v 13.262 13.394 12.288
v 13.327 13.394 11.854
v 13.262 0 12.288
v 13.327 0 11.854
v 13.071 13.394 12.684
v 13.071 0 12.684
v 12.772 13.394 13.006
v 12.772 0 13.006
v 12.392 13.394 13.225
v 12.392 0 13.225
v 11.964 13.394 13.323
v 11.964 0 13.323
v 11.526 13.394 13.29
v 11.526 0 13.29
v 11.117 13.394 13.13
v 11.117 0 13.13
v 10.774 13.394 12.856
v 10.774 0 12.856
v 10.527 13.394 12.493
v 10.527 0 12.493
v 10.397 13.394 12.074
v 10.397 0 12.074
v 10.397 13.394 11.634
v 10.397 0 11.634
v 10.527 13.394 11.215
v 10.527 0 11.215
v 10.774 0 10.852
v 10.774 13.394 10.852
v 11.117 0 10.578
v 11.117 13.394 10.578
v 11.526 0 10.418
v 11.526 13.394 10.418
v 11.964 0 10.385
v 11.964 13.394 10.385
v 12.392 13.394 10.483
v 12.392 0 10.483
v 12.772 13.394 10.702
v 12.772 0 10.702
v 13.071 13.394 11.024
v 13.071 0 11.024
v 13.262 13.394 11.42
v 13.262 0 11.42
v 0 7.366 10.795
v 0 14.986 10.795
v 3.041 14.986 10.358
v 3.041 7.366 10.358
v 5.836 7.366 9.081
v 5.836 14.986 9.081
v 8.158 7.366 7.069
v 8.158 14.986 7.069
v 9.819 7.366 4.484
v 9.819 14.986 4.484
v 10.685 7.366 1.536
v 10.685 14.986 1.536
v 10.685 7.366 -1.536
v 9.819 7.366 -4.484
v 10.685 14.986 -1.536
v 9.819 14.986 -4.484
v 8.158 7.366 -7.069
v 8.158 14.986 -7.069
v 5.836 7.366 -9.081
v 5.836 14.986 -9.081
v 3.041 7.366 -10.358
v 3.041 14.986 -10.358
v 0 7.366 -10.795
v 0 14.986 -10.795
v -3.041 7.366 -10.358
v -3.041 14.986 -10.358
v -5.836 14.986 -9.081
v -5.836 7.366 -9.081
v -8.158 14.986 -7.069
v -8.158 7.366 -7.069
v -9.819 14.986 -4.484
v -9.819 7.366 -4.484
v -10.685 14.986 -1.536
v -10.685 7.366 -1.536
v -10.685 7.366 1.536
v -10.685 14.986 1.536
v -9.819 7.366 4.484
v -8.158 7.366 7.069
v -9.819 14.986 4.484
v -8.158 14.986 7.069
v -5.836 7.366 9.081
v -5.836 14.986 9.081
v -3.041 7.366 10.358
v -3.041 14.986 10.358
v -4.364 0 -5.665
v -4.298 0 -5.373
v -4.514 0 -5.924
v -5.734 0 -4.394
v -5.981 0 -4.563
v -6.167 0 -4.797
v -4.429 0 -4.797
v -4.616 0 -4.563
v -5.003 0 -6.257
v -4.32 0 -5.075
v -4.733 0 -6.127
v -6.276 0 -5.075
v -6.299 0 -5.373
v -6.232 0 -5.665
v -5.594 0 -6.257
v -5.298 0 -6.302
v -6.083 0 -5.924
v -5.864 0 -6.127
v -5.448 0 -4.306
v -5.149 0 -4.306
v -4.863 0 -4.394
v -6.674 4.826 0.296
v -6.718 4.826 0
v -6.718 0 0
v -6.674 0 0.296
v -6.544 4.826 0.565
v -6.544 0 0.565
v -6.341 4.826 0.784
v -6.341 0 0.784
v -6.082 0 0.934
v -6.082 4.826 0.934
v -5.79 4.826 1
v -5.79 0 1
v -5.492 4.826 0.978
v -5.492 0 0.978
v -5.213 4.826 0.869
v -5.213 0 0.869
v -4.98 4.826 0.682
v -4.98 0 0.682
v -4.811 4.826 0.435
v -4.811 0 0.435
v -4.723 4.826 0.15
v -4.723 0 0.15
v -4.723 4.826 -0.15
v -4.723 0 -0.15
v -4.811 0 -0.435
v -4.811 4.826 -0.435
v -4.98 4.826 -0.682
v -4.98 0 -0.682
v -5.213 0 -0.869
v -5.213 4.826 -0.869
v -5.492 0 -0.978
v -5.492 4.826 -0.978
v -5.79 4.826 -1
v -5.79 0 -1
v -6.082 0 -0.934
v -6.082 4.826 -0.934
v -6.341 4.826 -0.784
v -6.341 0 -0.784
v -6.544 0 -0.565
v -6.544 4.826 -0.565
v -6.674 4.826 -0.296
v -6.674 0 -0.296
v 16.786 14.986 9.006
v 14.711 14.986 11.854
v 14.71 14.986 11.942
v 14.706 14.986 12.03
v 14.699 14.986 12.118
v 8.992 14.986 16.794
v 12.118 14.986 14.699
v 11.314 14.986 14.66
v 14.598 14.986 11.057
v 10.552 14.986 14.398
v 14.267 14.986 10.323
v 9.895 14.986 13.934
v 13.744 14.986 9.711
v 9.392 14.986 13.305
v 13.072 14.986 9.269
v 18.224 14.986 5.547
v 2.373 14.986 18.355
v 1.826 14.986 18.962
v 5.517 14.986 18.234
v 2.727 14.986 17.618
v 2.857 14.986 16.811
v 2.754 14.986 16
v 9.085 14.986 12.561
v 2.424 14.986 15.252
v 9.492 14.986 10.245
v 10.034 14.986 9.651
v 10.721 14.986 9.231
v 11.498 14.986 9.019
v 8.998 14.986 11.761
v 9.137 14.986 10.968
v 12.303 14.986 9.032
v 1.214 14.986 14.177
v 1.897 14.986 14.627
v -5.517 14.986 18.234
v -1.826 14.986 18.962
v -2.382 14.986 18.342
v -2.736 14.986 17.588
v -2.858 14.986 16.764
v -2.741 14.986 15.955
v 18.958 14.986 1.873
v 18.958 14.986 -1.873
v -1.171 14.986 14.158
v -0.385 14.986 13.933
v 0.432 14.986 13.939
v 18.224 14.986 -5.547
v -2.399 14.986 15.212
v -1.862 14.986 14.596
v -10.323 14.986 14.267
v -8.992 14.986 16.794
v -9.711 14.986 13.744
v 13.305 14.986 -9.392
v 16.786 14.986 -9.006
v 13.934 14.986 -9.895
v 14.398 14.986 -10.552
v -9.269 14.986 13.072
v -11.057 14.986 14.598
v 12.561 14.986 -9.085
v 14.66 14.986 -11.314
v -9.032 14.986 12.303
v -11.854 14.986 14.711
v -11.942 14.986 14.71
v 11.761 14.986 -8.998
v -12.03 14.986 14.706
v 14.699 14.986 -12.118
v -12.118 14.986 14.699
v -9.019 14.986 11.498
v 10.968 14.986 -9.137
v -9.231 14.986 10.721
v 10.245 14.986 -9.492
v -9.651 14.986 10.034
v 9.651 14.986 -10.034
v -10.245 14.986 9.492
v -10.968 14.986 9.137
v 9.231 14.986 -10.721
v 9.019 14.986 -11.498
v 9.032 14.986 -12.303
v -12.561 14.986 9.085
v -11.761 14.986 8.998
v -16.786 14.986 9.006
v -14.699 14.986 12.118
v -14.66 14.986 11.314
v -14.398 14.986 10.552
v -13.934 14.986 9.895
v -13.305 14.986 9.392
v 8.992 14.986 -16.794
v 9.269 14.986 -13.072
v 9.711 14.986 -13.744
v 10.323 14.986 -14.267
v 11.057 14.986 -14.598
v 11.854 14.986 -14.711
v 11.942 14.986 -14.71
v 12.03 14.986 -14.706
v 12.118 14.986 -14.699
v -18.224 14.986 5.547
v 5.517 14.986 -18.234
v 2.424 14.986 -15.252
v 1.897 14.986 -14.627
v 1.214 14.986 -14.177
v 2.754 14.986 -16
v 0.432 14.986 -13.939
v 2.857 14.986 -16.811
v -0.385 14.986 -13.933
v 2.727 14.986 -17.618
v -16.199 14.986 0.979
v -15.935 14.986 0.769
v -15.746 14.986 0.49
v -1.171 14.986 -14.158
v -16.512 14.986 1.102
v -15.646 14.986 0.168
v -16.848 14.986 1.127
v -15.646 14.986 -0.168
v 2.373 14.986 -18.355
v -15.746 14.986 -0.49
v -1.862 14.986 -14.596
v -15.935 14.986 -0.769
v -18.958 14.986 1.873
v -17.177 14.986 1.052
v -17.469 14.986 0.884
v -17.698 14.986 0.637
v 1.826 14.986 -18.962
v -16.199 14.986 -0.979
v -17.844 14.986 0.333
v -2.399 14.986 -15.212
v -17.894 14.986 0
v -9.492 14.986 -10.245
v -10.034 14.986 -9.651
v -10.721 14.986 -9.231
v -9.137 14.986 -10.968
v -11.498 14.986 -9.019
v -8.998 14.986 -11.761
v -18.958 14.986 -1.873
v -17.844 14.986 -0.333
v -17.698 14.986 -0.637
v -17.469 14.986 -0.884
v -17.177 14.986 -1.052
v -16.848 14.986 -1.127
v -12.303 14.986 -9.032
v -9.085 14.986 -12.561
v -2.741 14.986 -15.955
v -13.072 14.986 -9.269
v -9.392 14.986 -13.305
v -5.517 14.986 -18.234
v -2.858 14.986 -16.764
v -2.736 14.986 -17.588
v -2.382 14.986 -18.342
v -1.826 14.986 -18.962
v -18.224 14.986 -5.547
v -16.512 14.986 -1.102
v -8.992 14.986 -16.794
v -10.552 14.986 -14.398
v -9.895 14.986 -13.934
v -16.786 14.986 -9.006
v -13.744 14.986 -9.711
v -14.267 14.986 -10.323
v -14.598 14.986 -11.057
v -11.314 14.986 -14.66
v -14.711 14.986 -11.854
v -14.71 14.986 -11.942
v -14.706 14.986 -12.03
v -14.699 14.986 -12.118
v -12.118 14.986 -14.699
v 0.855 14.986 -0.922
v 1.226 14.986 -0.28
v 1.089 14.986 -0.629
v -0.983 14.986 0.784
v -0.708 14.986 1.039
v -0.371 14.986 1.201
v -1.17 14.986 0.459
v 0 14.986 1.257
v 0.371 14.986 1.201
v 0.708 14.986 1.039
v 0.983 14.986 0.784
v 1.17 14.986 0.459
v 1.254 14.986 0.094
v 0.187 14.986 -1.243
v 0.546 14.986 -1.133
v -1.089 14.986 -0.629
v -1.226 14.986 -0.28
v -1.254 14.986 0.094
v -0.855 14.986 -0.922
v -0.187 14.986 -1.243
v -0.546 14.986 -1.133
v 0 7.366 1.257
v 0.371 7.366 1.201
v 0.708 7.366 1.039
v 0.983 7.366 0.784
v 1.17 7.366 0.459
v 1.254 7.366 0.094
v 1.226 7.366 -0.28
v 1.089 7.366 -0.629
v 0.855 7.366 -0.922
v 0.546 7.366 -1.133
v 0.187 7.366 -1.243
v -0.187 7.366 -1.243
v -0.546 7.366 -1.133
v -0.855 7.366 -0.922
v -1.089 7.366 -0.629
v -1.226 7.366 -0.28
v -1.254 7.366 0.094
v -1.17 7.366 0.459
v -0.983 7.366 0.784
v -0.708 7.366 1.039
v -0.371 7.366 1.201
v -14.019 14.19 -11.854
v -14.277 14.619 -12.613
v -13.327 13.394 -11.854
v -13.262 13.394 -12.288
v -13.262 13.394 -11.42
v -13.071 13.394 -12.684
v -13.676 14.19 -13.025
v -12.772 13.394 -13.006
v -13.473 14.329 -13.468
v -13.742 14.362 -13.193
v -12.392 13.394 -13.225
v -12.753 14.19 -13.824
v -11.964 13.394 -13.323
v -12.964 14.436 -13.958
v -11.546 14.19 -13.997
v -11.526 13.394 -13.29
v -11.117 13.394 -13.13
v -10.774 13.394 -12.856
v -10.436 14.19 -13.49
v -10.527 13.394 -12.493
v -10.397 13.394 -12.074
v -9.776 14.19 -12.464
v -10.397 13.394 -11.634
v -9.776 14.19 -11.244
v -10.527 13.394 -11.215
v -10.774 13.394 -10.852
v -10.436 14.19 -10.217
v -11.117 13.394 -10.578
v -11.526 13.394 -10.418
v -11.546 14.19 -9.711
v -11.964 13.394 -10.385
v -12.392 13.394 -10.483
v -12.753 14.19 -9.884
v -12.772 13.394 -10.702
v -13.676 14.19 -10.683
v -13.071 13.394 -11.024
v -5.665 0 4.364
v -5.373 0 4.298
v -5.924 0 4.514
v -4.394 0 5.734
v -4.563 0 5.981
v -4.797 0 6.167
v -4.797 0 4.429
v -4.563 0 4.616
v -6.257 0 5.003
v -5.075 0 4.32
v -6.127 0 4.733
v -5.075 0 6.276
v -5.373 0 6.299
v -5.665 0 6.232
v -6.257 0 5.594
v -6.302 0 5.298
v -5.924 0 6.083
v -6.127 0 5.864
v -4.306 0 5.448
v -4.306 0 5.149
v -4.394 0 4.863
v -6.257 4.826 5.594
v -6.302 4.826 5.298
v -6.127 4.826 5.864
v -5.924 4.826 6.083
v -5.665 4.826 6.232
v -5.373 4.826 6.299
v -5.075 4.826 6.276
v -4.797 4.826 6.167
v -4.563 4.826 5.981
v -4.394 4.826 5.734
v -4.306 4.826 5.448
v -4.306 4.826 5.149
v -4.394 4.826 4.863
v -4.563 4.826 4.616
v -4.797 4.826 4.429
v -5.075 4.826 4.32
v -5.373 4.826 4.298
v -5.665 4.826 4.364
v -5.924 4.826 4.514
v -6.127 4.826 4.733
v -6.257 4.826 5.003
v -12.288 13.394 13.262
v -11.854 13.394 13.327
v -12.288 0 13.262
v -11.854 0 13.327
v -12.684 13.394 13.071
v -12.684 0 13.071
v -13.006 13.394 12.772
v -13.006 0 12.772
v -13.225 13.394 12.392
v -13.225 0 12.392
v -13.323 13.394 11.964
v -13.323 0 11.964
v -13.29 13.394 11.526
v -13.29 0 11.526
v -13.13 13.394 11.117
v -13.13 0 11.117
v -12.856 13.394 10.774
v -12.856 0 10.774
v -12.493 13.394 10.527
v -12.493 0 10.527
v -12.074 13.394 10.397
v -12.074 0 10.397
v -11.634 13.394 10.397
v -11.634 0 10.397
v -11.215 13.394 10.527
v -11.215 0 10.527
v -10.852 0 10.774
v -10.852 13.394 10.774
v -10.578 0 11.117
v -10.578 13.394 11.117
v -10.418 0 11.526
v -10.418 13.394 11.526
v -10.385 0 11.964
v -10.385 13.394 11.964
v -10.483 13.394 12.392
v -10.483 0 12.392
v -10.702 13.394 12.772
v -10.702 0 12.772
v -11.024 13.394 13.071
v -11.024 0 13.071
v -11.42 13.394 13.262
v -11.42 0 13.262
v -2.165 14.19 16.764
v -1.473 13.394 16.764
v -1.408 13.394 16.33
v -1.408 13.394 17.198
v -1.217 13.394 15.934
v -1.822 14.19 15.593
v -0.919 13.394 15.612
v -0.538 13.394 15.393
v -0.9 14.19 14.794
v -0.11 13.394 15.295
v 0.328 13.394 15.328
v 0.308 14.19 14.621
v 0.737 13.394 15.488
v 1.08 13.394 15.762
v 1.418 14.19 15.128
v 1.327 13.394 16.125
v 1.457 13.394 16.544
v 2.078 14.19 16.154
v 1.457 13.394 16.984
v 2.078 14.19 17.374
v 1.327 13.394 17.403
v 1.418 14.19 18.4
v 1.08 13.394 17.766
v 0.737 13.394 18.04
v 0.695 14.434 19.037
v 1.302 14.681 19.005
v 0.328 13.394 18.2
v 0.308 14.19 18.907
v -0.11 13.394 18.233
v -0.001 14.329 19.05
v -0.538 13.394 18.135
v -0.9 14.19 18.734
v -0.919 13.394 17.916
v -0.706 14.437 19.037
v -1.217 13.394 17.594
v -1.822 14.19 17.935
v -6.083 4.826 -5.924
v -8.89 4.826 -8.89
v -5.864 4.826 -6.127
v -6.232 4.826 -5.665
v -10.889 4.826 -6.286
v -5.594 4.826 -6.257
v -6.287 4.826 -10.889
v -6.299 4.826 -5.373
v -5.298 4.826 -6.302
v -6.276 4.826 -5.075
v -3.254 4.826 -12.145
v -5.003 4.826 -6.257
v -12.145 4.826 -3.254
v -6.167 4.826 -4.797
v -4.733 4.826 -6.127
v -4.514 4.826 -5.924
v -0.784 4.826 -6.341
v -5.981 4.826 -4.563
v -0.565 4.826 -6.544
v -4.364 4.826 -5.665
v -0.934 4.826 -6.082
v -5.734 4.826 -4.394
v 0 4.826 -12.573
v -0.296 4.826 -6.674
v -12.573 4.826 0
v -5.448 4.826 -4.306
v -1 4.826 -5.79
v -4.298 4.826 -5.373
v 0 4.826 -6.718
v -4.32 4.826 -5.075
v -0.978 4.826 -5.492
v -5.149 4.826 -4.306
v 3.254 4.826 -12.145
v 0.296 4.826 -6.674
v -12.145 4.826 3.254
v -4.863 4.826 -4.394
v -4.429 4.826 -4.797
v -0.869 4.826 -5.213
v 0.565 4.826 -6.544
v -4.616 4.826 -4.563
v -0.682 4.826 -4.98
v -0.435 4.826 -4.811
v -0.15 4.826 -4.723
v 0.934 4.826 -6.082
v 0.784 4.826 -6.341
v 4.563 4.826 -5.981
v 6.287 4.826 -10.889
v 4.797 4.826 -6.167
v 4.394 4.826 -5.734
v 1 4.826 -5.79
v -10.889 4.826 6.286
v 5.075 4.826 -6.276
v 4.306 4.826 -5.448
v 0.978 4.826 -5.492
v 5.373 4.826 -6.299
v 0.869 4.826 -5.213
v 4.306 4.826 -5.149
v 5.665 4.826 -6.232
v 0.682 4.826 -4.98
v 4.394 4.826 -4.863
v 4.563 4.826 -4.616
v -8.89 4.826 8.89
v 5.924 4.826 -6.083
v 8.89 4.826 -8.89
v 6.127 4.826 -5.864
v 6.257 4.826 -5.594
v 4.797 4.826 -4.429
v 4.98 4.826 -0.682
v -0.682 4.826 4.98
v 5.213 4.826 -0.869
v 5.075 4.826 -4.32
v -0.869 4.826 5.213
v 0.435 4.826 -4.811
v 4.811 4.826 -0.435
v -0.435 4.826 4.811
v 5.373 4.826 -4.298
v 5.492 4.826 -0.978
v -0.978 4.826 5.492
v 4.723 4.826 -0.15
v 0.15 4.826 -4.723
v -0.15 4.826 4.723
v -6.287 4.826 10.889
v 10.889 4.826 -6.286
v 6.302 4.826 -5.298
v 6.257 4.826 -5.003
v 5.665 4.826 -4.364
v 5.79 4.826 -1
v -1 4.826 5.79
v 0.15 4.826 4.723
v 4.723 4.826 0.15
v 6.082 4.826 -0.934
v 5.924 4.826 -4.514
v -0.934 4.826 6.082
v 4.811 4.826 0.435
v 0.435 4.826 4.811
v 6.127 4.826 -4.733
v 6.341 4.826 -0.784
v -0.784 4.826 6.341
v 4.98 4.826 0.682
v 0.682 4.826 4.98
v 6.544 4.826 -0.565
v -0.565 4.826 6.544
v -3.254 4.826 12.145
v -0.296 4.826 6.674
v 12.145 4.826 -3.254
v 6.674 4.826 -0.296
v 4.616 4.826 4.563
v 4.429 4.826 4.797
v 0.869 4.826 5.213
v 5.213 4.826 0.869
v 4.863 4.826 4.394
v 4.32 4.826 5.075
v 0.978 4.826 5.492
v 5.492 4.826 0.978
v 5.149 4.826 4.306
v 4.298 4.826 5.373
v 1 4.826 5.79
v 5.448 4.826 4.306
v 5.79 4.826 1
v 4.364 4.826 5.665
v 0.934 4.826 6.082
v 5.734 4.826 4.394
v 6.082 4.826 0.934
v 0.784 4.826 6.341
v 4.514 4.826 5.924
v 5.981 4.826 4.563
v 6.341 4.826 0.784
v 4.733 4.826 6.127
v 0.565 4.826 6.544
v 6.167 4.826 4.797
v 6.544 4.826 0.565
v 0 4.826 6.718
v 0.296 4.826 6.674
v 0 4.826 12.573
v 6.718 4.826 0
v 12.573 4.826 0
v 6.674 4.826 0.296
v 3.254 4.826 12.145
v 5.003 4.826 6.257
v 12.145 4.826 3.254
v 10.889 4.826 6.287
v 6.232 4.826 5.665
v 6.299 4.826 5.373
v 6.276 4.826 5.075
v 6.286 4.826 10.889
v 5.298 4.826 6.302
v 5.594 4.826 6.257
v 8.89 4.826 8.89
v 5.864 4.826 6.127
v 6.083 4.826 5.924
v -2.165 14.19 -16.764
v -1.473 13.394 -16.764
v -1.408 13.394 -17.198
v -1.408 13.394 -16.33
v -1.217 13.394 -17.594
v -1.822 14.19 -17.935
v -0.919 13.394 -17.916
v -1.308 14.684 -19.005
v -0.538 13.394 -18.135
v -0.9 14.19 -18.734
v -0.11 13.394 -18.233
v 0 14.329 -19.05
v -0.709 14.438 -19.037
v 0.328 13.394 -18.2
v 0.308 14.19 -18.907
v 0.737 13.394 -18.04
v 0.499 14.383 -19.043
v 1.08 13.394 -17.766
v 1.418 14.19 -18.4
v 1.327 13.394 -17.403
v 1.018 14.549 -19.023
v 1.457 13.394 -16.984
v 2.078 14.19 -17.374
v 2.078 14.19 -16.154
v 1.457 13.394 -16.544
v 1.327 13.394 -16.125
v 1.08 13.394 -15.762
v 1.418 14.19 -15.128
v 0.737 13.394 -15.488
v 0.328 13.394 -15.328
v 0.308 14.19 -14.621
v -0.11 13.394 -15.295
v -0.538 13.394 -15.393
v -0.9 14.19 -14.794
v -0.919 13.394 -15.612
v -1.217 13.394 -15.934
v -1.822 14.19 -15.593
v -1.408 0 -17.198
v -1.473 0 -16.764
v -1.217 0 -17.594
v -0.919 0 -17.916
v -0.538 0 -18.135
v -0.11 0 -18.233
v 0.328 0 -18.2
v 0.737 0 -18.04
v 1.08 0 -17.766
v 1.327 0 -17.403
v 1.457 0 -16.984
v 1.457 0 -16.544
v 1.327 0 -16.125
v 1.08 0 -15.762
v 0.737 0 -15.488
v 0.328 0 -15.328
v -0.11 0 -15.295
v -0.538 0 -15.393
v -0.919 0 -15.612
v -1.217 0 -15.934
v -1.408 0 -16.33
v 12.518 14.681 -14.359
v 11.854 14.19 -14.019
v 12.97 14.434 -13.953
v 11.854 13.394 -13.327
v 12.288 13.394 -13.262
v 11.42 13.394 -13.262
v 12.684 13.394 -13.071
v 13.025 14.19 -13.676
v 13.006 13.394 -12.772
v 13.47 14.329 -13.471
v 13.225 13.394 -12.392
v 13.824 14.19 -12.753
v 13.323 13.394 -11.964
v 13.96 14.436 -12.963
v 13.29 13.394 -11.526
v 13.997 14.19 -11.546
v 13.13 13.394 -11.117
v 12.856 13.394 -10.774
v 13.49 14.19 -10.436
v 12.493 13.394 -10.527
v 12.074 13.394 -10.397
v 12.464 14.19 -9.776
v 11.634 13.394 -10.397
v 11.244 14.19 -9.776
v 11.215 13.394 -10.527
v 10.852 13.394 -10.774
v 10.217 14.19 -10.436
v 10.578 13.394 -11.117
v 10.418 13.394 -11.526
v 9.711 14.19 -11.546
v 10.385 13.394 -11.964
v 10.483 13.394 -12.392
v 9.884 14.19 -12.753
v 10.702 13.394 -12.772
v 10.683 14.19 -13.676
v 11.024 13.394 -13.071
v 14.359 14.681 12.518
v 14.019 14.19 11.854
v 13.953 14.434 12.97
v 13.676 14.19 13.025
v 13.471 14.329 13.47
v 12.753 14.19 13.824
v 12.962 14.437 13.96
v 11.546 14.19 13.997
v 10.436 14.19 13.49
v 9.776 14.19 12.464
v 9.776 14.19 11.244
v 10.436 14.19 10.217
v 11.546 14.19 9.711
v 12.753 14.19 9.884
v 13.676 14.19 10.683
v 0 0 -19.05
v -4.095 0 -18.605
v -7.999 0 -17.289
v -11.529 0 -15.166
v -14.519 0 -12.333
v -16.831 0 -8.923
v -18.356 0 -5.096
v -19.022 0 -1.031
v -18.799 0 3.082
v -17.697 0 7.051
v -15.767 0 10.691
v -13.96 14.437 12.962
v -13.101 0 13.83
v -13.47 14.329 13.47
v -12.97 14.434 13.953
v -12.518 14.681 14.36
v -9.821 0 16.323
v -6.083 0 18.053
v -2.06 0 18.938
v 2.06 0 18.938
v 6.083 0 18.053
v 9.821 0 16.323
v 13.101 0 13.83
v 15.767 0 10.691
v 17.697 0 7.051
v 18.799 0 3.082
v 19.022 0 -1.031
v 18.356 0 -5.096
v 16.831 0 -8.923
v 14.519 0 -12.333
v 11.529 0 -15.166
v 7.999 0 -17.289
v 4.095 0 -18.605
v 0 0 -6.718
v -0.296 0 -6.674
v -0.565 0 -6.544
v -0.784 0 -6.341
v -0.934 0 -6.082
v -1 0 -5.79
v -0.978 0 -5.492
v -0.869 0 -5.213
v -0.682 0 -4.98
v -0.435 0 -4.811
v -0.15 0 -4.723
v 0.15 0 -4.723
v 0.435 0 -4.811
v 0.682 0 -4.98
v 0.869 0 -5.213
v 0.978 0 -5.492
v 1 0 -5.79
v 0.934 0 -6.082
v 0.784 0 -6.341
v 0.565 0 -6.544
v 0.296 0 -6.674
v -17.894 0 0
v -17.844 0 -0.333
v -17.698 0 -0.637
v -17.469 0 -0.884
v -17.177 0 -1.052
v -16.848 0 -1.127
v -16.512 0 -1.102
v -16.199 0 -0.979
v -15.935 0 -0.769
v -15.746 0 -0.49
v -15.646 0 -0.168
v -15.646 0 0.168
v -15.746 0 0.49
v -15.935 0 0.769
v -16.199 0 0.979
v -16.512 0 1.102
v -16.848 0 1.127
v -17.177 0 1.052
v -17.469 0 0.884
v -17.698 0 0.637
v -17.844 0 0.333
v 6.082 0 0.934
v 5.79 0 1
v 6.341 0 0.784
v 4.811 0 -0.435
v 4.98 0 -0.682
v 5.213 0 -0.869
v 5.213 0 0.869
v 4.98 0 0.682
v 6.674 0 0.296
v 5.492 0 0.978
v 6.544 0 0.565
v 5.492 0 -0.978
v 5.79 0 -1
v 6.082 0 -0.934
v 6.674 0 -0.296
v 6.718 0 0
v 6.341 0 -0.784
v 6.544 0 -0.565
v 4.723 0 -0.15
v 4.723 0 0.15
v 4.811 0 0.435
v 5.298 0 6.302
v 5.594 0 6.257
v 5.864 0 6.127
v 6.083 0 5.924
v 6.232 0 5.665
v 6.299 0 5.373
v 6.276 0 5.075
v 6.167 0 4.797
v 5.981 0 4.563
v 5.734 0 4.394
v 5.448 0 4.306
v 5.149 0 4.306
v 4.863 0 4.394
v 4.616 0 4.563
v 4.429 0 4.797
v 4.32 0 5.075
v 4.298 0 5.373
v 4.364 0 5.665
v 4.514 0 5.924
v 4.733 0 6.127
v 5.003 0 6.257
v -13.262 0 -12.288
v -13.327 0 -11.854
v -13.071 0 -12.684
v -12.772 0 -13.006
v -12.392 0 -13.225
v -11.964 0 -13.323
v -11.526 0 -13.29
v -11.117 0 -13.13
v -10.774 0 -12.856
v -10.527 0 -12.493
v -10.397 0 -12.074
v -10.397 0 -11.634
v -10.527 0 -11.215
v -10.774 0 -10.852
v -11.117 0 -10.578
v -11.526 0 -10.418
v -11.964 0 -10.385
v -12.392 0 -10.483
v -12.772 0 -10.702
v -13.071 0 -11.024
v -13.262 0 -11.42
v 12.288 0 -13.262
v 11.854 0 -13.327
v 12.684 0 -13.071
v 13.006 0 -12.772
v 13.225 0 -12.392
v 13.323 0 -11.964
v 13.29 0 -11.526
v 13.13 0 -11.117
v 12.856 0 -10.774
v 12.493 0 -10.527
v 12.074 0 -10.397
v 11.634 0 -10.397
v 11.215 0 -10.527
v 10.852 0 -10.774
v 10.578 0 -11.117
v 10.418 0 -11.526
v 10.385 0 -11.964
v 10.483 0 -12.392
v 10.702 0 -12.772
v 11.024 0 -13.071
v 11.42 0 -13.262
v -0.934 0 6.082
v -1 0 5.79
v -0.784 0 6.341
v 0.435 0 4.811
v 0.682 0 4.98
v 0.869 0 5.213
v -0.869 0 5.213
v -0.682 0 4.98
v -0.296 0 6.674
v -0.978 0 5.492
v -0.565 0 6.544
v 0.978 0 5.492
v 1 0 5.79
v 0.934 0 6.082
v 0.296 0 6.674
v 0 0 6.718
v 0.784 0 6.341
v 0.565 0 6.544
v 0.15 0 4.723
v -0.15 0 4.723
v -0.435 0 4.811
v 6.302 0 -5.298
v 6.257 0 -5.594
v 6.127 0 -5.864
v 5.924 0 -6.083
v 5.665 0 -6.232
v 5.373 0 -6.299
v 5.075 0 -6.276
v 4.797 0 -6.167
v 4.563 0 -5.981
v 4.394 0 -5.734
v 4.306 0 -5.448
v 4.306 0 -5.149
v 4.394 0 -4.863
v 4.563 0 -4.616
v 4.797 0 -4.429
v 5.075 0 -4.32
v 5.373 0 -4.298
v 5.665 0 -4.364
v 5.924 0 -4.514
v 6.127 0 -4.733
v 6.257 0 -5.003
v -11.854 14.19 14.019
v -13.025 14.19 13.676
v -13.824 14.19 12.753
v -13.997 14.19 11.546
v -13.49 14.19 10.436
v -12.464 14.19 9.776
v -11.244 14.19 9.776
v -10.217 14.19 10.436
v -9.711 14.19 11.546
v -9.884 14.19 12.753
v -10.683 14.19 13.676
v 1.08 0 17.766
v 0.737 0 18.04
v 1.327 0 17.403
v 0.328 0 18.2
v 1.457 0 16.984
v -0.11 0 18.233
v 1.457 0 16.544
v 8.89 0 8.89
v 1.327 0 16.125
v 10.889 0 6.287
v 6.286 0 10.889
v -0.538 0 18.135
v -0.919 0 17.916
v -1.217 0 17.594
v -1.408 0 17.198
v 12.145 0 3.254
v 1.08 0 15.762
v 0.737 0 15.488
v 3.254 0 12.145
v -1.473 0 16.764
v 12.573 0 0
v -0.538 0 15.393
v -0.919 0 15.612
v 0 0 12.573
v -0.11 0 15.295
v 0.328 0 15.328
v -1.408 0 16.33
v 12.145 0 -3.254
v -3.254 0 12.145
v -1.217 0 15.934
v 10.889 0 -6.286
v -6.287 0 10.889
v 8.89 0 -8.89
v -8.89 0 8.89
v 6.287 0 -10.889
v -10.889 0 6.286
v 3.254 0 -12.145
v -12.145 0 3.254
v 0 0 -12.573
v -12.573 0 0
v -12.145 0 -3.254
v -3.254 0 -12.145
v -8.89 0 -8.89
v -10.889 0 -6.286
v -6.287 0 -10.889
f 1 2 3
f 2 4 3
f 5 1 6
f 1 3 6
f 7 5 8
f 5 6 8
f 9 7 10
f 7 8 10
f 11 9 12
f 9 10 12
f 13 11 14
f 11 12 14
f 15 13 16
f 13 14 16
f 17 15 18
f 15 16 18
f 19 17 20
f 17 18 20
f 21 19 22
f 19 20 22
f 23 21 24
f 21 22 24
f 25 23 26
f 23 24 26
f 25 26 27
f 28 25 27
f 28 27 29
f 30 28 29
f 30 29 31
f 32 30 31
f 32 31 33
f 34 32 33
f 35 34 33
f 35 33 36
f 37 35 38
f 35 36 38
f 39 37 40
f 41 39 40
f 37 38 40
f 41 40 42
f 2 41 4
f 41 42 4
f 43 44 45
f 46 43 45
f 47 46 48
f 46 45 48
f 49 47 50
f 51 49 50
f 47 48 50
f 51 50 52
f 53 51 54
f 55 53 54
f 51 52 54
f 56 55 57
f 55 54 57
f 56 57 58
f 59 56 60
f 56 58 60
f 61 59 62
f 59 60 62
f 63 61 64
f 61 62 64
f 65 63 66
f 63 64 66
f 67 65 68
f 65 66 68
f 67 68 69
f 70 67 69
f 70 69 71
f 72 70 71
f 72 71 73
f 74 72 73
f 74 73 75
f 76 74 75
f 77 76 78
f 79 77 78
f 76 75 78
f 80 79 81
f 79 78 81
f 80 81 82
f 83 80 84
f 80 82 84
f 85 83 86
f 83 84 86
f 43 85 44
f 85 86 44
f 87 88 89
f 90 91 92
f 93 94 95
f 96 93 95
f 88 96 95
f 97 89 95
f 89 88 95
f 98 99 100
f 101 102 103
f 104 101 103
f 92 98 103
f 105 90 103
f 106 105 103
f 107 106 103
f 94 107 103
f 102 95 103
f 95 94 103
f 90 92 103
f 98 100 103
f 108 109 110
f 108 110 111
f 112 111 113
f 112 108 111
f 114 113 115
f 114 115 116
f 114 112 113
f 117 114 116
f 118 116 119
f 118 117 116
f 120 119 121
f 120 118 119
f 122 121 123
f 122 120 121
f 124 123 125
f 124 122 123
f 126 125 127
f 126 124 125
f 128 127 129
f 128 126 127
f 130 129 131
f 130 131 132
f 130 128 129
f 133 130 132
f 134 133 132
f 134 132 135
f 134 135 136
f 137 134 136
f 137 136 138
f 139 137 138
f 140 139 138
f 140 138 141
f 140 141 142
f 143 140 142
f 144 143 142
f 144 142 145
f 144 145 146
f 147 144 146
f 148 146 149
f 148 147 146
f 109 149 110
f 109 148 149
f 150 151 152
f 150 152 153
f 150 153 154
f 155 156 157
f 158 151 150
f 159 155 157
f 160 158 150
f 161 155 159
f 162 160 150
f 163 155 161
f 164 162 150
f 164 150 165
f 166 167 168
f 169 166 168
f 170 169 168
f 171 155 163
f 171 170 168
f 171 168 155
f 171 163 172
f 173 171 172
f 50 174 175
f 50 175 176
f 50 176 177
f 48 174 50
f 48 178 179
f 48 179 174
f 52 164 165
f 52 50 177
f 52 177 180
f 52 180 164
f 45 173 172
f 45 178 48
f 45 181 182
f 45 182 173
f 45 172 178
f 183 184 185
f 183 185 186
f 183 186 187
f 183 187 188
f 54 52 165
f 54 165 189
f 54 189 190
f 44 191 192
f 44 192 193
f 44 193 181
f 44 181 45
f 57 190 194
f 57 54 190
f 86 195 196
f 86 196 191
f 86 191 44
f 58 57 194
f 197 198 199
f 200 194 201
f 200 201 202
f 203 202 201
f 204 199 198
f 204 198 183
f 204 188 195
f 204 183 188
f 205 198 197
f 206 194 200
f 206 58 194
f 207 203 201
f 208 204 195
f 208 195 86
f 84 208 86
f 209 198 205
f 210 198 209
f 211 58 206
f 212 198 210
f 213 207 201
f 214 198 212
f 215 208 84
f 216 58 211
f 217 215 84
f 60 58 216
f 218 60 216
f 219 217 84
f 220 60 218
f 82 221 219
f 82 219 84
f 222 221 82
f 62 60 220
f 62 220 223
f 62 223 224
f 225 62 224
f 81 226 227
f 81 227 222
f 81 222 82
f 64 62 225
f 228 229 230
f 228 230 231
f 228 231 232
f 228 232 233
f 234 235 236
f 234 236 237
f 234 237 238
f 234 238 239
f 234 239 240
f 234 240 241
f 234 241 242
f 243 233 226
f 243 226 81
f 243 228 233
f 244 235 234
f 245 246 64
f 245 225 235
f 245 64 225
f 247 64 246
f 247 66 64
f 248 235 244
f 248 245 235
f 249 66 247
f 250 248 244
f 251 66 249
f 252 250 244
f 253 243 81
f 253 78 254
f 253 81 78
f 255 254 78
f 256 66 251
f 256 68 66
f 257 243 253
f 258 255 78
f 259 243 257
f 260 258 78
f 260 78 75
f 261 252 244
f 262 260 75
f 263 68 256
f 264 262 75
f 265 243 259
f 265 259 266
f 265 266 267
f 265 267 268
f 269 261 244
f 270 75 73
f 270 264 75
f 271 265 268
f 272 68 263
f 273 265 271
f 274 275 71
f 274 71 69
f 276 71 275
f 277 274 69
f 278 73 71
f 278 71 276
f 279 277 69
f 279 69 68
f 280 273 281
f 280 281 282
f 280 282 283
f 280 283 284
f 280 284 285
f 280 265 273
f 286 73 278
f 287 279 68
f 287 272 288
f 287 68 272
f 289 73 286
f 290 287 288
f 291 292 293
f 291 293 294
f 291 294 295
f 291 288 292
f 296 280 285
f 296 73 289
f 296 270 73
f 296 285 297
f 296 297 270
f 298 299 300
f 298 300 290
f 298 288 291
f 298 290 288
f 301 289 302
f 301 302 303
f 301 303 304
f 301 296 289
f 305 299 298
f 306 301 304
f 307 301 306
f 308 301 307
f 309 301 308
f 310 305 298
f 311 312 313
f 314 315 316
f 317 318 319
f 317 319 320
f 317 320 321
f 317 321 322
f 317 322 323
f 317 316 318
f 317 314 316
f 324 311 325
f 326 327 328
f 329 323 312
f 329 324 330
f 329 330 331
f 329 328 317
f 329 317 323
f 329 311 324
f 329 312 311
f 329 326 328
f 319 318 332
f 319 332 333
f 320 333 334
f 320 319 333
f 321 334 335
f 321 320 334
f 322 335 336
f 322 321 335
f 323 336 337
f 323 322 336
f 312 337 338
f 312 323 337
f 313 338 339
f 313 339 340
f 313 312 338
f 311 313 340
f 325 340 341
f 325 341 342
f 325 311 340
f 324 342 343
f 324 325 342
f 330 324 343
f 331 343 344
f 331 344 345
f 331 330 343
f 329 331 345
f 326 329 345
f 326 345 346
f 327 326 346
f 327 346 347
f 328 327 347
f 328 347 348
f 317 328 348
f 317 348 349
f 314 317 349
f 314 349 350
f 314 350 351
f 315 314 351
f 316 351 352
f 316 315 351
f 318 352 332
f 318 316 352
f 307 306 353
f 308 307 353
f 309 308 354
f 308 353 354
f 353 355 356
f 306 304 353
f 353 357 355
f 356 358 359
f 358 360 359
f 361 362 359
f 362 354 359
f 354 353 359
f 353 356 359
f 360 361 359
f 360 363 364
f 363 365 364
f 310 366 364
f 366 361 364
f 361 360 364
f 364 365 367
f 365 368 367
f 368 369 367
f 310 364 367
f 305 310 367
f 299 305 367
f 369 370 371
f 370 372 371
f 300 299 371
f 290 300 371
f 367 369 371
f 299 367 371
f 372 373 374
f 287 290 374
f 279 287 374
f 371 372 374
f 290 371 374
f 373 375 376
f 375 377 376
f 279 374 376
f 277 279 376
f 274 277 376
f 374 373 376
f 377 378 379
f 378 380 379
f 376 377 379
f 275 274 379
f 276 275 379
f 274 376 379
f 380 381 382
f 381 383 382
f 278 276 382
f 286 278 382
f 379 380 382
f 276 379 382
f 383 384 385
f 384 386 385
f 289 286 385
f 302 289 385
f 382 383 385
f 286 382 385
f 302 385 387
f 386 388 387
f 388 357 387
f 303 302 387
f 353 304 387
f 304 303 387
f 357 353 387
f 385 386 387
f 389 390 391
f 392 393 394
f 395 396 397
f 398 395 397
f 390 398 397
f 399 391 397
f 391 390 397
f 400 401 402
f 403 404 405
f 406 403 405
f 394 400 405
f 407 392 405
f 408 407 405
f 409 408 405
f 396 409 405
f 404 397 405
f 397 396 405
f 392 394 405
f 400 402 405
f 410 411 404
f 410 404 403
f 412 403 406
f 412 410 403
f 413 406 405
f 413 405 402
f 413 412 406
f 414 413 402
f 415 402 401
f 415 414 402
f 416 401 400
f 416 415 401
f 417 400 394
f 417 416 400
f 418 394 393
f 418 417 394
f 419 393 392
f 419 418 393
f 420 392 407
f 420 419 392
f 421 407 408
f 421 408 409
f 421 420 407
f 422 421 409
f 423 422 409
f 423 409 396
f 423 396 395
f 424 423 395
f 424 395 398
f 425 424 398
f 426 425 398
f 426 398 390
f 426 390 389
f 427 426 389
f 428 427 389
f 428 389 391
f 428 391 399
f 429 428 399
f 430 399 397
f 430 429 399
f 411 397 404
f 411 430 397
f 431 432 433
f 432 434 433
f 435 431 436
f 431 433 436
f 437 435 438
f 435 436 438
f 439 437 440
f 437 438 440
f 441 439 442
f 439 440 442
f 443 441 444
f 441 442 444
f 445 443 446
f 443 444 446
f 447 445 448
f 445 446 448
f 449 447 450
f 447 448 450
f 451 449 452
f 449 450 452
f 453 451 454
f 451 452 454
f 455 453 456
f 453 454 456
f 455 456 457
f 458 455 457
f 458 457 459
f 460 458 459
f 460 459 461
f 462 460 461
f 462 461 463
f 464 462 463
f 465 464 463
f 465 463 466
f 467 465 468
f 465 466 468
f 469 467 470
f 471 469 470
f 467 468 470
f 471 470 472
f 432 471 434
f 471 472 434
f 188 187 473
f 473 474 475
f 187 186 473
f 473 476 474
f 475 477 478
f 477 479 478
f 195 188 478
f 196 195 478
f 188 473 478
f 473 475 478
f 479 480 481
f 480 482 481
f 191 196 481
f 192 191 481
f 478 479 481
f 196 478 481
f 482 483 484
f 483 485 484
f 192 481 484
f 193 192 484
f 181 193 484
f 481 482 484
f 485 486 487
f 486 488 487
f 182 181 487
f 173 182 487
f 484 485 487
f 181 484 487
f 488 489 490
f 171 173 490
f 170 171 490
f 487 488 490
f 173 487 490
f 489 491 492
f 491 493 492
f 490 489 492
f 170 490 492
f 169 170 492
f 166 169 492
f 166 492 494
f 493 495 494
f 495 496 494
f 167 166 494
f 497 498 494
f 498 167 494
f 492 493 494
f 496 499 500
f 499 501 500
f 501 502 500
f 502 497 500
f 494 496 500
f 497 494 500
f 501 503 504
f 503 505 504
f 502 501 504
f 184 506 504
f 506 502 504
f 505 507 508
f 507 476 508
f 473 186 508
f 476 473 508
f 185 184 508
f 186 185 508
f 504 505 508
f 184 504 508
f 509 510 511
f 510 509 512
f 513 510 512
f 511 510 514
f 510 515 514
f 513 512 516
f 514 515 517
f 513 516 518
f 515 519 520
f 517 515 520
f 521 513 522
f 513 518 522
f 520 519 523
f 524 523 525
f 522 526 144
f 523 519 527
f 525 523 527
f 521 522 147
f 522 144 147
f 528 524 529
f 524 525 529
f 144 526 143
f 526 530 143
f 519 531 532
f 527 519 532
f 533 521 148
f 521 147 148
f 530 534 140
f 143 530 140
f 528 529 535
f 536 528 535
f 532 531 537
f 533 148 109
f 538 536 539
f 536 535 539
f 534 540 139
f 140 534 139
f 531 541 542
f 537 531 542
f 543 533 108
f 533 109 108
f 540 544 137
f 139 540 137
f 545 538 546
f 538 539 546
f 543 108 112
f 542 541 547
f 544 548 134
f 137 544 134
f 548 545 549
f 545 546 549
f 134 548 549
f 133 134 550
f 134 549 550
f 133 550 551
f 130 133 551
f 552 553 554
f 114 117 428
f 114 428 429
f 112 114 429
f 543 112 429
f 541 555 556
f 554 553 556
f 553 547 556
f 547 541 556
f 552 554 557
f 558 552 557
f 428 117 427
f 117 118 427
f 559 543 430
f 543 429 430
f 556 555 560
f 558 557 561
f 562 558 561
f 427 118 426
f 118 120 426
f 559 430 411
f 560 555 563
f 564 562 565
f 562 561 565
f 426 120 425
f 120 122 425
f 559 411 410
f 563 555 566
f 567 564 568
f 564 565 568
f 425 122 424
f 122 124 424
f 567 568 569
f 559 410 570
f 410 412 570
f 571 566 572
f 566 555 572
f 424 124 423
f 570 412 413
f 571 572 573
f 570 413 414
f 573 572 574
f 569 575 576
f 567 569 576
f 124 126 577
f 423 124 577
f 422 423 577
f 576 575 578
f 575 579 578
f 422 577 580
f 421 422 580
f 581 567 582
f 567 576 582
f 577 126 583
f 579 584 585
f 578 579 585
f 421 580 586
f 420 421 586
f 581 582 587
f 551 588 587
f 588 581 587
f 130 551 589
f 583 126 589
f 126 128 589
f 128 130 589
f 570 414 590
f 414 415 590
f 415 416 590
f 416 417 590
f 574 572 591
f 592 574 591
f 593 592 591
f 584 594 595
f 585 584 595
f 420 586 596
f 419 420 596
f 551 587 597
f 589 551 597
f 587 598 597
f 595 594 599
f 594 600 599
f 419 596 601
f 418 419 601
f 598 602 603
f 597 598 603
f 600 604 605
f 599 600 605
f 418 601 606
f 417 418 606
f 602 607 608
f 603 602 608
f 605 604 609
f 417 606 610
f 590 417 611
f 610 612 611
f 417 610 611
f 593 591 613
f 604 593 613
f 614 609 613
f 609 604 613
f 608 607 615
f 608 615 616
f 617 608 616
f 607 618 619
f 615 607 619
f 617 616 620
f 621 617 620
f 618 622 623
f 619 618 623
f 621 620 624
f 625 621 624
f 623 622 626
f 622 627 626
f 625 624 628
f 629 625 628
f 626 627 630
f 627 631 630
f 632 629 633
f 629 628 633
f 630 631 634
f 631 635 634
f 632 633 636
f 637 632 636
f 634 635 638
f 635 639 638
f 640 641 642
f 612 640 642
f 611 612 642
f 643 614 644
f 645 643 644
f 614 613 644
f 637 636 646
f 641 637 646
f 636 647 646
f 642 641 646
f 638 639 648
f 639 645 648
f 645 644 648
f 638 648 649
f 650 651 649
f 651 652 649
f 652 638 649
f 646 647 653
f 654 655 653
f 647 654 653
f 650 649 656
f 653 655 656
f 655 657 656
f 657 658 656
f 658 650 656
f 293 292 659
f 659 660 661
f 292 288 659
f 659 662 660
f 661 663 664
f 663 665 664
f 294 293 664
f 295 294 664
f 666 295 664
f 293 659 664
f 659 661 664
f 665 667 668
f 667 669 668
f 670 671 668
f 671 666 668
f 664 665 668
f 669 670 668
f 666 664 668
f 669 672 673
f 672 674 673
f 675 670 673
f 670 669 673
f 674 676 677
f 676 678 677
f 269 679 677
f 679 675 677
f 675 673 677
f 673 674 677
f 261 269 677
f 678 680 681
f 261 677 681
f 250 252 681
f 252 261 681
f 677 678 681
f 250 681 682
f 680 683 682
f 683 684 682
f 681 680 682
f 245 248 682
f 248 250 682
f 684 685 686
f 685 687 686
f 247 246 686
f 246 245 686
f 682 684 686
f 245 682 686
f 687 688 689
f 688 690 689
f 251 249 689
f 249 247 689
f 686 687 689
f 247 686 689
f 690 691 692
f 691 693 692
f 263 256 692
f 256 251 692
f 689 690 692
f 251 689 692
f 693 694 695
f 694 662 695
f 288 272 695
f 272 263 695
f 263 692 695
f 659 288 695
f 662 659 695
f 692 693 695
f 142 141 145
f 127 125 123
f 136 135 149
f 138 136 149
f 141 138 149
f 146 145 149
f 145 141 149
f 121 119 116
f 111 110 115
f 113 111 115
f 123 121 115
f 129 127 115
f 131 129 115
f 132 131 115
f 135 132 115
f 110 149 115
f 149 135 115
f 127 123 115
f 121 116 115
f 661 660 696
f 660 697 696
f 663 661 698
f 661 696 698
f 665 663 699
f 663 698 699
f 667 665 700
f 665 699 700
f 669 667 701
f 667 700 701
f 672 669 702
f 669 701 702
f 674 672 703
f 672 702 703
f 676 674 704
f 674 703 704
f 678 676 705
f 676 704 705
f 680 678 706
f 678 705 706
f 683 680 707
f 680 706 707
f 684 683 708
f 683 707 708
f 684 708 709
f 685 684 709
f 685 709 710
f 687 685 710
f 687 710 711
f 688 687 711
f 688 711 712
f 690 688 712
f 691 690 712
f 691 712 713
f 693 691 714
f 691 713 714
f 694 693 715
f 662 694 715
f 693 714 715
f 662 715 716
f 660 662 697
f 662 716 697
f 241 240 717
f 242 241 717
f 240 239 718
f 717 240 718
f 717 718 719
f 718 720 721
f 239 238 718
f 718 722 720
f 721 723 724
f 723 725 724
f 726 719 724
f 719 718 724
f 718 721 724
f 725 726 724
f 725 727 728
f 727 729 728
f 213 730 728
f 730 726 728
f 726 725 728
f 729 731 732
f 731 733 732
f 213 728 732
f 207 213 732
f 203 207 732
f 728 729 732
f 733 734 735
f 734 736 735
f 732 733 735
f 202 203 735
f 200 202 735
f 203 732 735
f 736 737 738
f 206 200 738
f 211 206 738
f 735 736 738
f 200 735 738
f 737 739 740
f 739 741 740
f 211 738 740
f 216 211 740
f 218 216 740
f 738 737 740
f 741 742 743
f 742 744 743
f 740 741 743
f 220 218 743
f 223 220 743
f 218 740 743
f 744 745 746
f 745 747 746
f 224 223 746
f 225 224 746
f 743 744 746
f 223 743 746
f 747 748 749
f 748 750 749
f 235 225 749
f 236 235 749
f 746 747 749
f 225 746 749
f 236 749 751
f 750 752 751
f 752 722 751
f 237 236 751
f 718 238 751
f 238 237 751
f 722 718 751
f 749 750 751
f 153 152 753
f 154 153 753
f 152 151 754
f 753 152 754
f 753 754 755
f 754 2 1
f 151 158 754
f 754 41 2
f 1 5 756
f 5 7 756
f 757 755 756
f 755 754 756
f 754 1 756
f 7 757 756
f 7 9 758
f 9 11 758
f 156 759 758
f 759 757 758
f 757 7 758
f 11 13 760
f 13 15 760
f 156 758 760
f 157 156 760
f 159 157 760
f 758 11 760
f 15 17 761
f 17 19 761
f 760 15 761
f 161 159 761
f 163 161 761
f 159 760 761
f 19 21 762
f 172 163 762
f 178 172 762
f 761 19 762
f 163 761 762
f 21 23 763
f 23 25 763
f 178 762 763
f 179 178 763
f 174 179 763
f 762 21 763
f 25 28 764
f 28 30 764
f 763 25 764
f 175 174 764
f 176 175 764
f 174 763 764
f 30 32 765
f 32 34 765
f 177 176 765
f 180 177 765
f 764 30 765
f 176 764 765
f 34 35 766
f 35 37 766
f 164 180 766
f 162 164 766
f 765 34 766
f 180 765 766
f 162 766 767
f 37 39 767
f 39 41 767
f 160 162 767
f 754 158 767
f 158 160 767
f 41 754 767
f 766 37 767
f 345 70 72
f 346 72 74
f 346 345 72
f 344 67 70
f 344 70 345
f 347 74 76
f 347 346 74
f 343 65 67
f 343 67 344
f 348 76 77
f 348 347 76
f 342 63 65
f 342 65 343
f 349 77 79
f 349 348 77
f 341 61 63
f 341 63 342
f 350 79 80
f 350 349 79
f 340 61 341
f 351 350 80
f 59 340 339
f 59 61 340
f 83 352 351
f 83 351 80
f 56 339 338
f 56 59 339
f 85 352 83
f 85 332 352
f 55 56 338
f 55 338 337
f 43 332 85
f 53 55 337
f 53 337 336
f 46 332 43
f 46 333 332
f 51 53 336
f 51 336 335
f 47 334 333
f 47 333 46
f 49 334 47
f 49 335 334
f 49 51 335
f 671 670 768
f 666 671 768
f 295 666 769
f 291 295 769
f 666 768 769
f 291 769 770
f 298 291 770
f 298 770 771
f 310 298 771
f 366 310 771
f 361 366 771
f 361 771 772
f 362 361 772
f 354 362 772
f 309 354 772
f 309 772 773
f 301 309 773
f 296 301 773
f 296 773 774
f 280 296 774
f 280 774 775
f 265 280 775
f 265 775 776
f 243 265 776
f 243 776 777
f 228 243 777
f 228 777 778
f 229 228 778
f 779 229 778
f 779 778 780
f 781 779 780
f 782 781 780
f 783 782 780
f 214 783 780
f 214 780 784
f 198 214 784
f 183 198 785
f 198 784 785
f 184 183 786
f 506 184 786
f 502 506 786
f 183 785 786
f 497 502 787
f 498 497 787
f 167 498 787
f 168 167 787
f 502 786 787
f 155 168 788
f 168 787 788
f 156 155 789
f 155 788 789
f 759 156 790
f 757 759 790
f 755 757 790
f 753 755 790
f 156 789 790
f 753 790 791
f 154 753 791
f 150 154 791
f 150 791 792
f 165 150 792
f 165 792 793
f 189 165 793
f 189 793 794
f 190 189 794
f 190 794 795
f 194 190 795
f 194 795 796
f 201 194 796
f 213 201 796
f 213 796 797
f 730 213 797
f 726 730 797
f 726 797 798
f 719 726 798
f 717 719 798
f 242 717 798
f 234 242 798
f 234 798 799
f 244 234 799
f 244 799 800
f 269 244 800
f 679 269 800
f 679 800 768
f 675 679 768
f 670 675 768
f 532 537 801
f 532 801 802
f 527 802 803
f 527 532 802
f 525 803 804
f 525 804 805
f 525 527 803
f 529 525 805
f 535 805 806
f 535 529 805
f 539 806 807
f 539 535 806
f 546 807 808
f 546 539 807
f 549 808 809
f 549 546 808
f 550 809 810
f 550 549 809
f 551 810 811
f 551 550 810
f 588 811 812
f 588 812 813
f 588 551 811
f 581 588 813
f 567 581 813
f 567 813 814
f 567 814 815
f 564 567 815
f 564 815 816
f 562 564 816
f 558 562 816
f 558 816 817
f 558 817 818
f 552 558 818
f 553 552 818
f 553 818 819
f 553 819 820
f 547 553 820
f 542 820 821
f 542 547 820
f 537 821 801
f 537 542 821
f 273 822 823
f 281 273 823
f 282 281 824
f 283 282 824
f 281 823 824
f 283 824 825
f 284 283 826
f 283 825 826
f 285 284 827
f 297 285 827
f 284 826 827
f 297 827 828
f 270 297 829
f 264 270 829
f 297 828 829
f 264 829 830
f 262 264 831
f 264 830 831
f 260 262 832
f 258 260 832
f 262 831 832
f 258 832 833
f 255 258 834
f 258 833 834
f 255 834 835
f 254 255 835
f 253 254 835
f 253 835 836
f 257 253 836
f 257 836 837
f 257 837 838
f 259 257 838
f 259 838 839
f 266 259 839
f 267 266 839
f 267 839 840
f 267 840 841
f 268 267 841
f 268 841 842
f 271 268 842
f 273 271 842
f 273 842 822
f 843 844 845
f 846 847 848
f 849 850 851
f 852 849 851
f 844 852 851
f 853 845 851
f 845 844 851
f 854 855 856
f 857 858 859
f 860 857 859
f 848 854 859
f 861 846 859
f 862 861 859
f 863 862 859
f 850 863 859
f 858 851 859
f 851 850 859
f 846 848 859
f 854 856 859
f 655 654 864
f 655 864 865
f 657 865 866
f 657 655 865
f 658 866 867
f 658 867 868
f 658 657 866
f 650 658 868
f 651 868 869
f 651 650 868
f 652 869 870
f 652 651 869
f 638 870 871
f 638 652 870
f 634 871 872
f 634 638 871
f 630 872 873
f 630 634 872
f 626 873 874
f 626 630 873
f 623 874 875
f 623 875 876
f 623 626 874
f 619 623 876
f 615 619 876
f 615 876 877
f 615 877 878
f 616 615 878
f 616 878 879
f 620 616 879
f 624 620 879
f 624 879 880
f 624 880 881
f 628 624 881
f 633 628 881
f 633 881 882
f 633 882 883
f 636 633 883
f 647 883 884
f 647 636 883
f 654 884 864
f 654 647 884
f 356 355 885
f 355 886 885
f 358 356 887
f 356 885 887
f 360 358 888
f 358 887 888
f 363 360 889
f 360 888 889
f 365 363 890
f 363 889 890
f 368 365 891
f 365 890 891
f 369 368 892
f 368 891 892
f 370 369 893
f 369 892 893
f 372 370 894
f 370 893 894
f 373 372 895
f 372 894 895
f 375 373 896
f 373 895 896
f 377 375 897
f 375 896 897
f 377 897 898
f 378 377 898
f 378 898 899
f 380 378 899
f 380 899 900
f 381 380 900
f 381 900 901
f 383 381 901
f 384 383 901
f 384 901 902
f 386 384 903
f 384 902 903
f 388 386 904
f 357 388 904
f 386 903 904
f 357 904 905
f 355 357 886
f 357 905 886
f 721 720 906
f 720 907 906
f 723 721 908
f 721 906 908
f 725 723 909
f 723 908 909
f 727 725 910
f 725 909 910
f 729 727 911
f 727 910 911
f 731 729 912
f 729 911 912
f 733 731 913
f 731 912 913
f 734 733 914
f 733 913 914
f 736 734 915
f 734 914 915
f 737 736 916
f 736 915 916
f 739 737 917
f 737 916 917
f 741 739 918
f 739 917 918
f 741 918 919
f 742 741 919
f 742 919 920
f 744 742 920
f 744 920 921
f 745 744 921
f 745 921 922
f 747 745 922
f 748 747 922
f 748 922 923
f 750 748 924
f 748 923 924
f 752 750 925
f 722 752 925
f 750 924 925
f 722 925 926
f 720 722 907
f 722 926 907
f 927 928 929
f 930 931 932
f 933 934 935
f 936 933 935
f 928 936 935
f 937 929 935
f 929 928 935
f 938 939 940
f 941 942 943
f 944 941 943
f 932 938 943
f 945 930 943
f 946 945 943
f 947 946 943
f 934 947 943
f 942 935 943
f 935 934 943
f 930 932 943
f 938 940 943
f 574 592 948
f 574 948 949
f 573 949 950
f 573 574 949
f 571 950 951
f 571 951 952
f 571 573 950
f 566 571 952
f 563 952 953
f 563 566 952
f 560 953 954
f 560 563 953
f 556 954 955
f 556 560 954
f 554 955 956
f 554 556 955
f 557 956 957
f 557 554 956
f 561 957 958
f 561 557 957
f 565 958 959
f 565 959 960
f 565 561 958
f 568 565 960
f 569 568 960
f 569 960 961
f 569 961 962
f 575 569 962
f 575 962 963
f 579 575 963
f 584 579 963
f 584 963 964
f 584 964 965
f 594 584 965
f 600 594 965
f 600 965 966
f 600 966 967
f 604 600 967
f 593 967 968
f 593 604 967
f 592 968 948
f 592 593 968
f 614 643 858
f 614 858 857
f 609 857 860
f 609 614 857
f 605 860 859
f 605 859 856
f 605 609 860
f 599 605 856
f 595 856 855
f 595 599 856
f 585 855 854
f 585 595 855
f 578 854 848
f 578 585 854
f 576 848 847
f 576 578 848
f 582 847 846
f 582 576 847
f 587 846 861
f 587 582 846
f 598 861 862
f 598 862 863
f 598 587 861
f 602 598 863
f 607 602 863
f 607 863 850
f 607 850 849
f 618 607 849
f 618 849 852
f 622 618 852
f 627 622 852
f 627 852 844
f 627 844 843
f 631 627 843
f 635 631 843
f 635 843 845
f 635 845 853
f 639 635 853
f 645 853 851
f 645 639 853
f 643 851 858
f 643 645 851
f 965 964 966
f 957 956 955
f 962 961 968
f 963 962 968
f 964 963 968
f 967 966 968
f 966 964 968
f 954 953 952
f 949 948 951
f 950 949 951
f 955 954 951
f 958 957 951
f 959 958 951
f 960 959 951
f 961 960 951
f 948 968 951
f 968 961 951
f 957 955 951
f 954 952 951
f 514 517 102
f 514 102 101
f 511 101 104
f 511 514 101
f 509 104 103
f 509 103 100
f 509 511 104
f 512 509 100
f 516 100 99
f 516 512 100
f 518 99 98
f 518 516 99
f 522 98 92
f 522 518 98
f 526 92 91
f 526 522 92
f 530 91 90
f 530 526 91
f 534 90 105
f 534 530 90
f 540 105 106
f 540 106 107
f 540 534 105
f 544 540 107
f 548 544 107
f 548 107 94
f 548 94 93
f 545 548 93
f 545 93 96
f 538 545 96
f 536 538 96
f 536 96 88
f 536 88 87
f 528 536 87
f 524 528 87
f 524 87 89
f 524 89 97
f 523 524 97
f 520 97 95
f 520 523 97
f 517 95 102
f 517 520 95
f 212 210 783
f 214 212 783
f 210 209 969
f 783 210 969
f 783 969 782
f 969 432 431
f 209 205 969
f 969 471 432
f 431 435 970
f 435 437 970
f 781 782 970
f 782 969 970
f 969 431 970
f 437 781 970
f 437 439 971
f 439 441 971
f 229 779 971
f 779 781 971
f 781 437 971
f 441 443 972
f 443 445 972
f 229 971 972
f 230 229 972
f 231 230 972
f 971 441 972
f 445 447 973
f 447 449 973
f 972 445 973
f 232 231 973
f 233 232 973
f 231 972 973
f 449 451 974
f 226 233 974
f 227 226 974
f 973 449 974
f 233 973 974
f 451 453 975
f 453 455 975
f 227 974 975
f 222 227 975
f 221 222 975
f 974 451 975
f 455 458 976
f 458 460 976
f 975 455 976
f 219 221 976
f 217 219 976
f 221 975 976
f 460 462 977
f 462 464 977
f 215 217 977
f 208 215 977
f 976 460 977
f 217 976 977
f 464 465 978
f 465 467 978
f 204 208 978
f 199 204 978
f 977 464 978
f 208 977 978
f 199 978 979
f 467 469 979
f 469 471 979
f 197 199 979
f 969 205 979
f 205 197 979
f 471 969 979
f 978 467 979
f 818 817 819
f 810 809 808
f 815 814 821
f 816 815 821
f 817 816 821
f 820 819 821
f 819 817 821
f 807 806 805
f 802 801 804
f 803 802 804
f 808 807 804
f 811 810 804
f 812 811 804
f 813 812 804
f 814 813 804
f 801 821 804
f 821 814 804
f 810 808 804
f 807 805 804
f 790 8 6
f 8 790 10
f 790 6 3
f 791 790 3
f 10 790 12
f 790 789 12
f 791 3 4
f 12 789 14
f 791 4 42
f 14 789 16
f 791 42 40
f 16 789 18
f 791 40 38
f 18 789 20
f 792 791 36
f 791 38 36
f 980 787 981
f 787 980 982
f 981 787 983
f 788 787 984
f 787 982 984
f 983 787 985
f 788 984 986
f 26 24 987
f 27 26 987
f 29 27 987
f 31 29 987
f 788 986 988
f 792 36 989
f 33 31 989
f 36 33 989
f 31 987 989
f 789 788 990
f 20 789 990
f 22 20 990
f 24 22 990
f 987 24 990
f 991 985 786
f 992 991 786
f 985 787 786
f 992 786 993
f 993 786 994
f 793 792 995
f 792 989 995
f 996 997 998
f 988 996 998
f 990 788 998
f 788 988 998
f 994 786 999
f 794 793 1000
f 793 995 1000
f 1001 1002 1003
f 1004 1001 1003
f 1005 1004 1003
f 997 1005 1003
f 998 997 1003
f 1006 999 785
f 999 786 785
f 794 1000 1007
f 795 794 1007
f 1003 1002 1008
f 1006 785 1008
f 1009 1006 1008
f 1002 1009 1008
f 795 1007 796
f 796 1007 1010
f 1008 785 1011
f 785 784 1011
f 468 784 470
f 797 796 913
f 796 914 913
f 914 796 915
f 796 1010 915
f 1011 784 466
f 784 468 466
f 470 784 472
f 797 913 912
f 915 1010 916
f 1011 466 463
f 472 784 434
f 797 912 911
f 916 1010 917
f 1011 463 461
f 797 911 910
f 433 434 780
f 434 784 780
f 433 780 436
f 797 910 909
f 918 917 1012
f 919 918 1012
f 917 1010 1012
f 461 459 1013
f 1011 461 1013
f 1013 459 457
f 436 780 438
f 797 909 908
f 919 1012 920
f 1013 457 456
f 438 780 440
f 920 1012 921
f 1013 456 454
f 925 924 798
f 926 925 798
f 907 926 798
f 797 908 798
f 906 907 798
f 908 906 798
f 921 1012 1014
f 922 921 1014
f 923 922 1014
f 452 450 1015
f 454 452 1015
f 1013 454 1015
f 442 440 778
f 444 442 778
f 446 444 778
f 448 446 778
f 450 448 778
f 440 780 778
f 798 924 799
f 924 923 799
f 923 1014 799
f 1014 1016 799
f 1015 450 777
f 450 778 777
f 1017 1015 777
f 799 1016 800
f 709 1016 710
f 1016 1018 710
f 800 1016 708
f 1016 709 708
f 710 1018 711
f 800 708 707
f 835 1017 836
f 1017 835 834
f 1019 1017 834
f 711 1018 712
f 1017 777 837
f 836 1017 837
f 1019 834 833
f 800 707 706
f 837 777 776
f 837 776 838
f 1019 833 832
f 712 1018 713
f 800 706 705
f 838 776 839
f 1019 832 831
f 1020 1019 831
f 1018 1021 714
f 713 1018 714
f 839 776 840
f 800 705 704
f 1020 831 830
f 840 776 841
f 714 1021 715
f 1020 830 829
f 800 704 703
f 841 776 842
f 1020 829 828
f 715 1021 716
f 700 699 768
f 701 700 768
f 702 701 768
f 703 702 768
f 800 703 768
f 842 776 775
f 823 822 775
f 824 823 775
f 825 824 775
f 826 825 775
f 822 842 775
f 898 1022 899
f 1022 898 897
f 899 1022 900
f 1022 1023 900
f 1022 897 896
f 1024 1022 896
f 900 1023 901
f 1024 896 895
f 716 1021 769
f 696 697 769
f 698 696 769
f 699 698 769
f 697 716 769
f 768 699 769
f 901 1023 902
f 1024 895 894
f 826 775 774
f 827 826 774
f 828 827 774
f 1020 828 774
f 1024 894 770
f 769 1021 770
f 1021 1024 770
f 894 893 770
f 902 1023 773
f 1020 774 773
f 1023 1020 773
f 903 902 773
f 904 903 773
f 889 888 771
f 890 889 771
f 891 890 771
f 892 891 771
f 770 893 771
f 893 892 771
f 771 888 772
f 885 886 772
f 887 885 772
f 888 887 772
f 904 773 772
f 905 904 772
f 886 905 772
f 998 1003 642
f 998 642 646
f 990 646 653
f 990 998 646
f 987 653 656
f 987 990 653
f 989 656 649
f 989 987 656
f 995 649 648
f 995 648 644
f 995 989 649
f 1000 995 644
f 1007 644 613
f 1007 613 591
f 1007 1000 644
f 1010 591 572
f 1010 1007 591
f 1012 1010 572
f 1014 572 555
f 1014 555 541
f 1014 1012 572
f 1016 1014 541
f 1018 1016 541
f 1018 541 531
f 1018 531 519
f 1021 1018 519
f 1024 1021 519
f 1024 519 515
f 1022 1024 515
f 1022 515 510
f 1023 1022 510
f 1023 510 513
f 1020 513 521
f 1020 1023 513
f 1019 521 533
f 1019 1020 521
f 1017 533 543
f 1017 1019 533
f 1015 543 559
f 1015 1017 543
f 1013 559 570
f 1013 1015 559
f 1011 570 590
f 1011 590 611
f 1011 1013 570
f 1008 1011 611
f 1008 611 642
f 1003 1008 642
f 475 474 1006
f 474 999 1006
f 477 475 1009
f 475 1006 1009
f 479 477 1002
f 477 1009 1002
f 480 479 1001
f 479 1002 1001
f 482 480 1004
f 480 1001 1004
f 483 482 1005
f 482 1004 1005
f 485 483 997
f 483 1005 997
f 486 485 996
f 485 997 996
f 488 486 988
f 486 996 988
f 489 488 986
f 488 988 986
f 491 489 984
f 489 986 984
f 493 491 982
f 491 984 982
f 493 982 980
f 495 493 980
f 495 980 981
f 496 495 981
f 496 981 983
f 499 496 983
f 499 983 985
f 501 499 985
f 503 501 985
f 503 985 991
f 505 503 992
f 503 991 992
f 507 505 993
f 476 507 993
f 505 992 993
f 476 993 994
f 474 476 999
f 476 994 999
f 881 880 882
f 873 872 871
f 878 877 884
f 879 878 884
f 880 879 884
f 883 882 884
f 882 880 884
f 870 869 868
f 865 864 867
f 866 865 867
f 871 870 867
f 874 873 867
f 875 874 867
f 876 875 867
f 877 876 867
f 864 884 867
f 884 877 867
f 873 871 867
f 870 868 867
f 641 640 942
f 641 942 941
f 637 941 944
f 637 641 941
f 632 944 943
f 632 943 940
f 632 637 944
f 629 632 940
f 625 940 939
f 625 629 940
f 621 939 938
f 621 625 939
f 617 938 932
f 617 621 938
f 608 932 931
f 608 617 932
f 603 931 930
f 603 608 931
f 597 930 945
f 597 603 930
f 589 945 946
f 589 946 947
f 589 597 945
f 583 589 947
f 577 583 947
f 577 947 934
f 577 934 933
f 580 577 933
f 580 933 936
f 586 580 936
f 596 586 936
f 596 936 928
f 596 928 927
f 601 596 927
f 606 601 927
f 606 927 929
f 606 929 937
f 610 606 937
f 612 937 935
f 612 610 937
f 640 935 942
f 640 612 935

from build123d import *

# Parameters (mm, degrees)
OUTER_R                                        = 19.05
BODY_DEPTH                                     = 14.986
INNER_R                                        = 12.573
POCKET_DEPTH                                   = 4.826
CSK_FOR_4_FLAT_HEAD_MACHINE_SCREW1_D           = 2.9464
CSK_FOR_4_FLAT_HEAD_MACHINE_SCREW1_CSINK_D     = 5.715
CSK_FOR_4_FLAT_HEAD_MACHINE_SCREW1_CSINK_ANGLE = 82
SCREW_HOLES_COUNT                              = 4
POST_START                                     = 4.826
POST_SKETCH_R                                  = 1.0033
POST_DEPTH                                     = 4.826
POSTS_COUNT                                    = 4
CUT_EXTRUDE1_START                             = 14.986
SOLONOID_SKETCH_R                              = 10.795
SOLONOID_SKETCH_R_2                            = 1.2573
CUT_EXTRUDE1_DEPTH                             = 7.62
F_4_40_TAPPED_HOLE1_D                          = 2.2606


with BuildPart() as part:
    # outer → Body (new body)
    with BuildSketch(Plane(origin=(0, 0, 0), x_dir=(1, 0, 0), z_dir=(0, 1, 0))):
        with Locations(Location((0, 0, 0), (0, 0, 90))):
            Circle(OUTER_R)
    extrude(amount=BODY_DEPTH)

    # inner → Pocket (cut)
    with BuildSketch(Plane(origin=(0, 0, 0), x_dir=(1, 0, 0), z_dir=(0, 1, 0))):
        with Locations(Location((0, 0, 0), (0, 0, 270))):
            Circle(INNER_R)
    extrude(amount=POCKET_DEPTH, mode=Mode.SUBTRACT)

    # CSK for #4 Flat Head Machine Screw1 (through all)
    with Locations(Plane(origin=(0, 14.986, 0), x_dir=(1, 0, 0), z_dir=(0, 1, 0))):
        with Locations((-11.85393808, 11.85393808)):
            csk_for_4_flat_head_machine_screw1 = CounterSinkHole(CSK_FOR_4_FLAT_HEAD_MACHINE_SCREW1_D / 2, CSK_FOR_4_FLAT_HEAD_MACHINE_SCREW1_CSINK_D / 2, counter_sink_angle=CSK_FOR_4_FLAT_HEAD_MACHINE_SCREW1_CSINK_ANGLE)

    # Screw Holes: CSK for #4 Flat Head Machine Screw1 ×4 about axis
    screw_holes_axis = Axis((0, 0, 0), (0, 1, 0))
    for i in range(1, SCREW_HOLES_COUNT):
        add(csk_for_4_flat_head_machine_screw1.rotate(screw_holes_axis, i * 360 / SCREW_HOLES_COUNT), mode=Mode.SUBTRACT)

    # Post Sketch → Post (add)
    with BuildSketch(Plane(origin=(0, 0, 0), x_dir=(1, 0, 0), z_dir=(0, 1, 0)).offset(POST_START)):
        with Locations(Location((0, -5.715, 0), (0, 0, 270))):
            Circle(POST_SKETCH_R)
        with Locations(Location((5.298351111, -5.298351111, 0), (0, 0, 270))):
            Circle(POST_SKETCH_R)
    post = extrude(amount=-POST_DEPTH)

    # Posts: Post ×4 about axis
    posts_axis = Axis((0, 0, 0), (0, 1, 0))
    for i in range(1, POSTS_COUNT):
        add(post.rotate(posts_axis, i * 360 / POSTS_COUNT))

    # Solonoid Sketch → Cut-Extrude1 (cut)
    with BuildSketch(Plane(origin=(0, 0, 0), x_dir=(1, 0, 0), z_dir=(0, 1, 0)).offset(CUT_EXTRUDE1_START)):
        with Locations(Location((0, 0, 0), (0, 0, 270))):
            Circle(SOLONOID_SKETCH_R)
        with Locations(Location((0, 0, 0), (0, 0, 270))):
            Circle(SOLONOID_SKETCH_R_2, mode=Mode.SUBTRACT)
    extrude(amount=-CUT_EXTRUDE1_DEPTH, mode=Mode.SUBTRACT)

    # Sketch-Pattern1: CSK for #4 Flat Head Machine Screw1 at 2 more places
    with Locations((11.853938, 0, -4.910062), (11.853938, 0, 28.617938)):
        add(csk_for_4_flat_head_machine_screw1, mode=Mode.SUBTRACT)

    # #4-40 Tapped Hole1 (through all)
    with Locations(Plane(origin=(0, 14.986, 0), x_dir=(1, 0, 0), z_dir=(0, 1, 0))):
        with Locations((-16.764, 0)):
            Hole(F_4_40_TAPPED_HOLE1_D / 2)


solid = part.part
